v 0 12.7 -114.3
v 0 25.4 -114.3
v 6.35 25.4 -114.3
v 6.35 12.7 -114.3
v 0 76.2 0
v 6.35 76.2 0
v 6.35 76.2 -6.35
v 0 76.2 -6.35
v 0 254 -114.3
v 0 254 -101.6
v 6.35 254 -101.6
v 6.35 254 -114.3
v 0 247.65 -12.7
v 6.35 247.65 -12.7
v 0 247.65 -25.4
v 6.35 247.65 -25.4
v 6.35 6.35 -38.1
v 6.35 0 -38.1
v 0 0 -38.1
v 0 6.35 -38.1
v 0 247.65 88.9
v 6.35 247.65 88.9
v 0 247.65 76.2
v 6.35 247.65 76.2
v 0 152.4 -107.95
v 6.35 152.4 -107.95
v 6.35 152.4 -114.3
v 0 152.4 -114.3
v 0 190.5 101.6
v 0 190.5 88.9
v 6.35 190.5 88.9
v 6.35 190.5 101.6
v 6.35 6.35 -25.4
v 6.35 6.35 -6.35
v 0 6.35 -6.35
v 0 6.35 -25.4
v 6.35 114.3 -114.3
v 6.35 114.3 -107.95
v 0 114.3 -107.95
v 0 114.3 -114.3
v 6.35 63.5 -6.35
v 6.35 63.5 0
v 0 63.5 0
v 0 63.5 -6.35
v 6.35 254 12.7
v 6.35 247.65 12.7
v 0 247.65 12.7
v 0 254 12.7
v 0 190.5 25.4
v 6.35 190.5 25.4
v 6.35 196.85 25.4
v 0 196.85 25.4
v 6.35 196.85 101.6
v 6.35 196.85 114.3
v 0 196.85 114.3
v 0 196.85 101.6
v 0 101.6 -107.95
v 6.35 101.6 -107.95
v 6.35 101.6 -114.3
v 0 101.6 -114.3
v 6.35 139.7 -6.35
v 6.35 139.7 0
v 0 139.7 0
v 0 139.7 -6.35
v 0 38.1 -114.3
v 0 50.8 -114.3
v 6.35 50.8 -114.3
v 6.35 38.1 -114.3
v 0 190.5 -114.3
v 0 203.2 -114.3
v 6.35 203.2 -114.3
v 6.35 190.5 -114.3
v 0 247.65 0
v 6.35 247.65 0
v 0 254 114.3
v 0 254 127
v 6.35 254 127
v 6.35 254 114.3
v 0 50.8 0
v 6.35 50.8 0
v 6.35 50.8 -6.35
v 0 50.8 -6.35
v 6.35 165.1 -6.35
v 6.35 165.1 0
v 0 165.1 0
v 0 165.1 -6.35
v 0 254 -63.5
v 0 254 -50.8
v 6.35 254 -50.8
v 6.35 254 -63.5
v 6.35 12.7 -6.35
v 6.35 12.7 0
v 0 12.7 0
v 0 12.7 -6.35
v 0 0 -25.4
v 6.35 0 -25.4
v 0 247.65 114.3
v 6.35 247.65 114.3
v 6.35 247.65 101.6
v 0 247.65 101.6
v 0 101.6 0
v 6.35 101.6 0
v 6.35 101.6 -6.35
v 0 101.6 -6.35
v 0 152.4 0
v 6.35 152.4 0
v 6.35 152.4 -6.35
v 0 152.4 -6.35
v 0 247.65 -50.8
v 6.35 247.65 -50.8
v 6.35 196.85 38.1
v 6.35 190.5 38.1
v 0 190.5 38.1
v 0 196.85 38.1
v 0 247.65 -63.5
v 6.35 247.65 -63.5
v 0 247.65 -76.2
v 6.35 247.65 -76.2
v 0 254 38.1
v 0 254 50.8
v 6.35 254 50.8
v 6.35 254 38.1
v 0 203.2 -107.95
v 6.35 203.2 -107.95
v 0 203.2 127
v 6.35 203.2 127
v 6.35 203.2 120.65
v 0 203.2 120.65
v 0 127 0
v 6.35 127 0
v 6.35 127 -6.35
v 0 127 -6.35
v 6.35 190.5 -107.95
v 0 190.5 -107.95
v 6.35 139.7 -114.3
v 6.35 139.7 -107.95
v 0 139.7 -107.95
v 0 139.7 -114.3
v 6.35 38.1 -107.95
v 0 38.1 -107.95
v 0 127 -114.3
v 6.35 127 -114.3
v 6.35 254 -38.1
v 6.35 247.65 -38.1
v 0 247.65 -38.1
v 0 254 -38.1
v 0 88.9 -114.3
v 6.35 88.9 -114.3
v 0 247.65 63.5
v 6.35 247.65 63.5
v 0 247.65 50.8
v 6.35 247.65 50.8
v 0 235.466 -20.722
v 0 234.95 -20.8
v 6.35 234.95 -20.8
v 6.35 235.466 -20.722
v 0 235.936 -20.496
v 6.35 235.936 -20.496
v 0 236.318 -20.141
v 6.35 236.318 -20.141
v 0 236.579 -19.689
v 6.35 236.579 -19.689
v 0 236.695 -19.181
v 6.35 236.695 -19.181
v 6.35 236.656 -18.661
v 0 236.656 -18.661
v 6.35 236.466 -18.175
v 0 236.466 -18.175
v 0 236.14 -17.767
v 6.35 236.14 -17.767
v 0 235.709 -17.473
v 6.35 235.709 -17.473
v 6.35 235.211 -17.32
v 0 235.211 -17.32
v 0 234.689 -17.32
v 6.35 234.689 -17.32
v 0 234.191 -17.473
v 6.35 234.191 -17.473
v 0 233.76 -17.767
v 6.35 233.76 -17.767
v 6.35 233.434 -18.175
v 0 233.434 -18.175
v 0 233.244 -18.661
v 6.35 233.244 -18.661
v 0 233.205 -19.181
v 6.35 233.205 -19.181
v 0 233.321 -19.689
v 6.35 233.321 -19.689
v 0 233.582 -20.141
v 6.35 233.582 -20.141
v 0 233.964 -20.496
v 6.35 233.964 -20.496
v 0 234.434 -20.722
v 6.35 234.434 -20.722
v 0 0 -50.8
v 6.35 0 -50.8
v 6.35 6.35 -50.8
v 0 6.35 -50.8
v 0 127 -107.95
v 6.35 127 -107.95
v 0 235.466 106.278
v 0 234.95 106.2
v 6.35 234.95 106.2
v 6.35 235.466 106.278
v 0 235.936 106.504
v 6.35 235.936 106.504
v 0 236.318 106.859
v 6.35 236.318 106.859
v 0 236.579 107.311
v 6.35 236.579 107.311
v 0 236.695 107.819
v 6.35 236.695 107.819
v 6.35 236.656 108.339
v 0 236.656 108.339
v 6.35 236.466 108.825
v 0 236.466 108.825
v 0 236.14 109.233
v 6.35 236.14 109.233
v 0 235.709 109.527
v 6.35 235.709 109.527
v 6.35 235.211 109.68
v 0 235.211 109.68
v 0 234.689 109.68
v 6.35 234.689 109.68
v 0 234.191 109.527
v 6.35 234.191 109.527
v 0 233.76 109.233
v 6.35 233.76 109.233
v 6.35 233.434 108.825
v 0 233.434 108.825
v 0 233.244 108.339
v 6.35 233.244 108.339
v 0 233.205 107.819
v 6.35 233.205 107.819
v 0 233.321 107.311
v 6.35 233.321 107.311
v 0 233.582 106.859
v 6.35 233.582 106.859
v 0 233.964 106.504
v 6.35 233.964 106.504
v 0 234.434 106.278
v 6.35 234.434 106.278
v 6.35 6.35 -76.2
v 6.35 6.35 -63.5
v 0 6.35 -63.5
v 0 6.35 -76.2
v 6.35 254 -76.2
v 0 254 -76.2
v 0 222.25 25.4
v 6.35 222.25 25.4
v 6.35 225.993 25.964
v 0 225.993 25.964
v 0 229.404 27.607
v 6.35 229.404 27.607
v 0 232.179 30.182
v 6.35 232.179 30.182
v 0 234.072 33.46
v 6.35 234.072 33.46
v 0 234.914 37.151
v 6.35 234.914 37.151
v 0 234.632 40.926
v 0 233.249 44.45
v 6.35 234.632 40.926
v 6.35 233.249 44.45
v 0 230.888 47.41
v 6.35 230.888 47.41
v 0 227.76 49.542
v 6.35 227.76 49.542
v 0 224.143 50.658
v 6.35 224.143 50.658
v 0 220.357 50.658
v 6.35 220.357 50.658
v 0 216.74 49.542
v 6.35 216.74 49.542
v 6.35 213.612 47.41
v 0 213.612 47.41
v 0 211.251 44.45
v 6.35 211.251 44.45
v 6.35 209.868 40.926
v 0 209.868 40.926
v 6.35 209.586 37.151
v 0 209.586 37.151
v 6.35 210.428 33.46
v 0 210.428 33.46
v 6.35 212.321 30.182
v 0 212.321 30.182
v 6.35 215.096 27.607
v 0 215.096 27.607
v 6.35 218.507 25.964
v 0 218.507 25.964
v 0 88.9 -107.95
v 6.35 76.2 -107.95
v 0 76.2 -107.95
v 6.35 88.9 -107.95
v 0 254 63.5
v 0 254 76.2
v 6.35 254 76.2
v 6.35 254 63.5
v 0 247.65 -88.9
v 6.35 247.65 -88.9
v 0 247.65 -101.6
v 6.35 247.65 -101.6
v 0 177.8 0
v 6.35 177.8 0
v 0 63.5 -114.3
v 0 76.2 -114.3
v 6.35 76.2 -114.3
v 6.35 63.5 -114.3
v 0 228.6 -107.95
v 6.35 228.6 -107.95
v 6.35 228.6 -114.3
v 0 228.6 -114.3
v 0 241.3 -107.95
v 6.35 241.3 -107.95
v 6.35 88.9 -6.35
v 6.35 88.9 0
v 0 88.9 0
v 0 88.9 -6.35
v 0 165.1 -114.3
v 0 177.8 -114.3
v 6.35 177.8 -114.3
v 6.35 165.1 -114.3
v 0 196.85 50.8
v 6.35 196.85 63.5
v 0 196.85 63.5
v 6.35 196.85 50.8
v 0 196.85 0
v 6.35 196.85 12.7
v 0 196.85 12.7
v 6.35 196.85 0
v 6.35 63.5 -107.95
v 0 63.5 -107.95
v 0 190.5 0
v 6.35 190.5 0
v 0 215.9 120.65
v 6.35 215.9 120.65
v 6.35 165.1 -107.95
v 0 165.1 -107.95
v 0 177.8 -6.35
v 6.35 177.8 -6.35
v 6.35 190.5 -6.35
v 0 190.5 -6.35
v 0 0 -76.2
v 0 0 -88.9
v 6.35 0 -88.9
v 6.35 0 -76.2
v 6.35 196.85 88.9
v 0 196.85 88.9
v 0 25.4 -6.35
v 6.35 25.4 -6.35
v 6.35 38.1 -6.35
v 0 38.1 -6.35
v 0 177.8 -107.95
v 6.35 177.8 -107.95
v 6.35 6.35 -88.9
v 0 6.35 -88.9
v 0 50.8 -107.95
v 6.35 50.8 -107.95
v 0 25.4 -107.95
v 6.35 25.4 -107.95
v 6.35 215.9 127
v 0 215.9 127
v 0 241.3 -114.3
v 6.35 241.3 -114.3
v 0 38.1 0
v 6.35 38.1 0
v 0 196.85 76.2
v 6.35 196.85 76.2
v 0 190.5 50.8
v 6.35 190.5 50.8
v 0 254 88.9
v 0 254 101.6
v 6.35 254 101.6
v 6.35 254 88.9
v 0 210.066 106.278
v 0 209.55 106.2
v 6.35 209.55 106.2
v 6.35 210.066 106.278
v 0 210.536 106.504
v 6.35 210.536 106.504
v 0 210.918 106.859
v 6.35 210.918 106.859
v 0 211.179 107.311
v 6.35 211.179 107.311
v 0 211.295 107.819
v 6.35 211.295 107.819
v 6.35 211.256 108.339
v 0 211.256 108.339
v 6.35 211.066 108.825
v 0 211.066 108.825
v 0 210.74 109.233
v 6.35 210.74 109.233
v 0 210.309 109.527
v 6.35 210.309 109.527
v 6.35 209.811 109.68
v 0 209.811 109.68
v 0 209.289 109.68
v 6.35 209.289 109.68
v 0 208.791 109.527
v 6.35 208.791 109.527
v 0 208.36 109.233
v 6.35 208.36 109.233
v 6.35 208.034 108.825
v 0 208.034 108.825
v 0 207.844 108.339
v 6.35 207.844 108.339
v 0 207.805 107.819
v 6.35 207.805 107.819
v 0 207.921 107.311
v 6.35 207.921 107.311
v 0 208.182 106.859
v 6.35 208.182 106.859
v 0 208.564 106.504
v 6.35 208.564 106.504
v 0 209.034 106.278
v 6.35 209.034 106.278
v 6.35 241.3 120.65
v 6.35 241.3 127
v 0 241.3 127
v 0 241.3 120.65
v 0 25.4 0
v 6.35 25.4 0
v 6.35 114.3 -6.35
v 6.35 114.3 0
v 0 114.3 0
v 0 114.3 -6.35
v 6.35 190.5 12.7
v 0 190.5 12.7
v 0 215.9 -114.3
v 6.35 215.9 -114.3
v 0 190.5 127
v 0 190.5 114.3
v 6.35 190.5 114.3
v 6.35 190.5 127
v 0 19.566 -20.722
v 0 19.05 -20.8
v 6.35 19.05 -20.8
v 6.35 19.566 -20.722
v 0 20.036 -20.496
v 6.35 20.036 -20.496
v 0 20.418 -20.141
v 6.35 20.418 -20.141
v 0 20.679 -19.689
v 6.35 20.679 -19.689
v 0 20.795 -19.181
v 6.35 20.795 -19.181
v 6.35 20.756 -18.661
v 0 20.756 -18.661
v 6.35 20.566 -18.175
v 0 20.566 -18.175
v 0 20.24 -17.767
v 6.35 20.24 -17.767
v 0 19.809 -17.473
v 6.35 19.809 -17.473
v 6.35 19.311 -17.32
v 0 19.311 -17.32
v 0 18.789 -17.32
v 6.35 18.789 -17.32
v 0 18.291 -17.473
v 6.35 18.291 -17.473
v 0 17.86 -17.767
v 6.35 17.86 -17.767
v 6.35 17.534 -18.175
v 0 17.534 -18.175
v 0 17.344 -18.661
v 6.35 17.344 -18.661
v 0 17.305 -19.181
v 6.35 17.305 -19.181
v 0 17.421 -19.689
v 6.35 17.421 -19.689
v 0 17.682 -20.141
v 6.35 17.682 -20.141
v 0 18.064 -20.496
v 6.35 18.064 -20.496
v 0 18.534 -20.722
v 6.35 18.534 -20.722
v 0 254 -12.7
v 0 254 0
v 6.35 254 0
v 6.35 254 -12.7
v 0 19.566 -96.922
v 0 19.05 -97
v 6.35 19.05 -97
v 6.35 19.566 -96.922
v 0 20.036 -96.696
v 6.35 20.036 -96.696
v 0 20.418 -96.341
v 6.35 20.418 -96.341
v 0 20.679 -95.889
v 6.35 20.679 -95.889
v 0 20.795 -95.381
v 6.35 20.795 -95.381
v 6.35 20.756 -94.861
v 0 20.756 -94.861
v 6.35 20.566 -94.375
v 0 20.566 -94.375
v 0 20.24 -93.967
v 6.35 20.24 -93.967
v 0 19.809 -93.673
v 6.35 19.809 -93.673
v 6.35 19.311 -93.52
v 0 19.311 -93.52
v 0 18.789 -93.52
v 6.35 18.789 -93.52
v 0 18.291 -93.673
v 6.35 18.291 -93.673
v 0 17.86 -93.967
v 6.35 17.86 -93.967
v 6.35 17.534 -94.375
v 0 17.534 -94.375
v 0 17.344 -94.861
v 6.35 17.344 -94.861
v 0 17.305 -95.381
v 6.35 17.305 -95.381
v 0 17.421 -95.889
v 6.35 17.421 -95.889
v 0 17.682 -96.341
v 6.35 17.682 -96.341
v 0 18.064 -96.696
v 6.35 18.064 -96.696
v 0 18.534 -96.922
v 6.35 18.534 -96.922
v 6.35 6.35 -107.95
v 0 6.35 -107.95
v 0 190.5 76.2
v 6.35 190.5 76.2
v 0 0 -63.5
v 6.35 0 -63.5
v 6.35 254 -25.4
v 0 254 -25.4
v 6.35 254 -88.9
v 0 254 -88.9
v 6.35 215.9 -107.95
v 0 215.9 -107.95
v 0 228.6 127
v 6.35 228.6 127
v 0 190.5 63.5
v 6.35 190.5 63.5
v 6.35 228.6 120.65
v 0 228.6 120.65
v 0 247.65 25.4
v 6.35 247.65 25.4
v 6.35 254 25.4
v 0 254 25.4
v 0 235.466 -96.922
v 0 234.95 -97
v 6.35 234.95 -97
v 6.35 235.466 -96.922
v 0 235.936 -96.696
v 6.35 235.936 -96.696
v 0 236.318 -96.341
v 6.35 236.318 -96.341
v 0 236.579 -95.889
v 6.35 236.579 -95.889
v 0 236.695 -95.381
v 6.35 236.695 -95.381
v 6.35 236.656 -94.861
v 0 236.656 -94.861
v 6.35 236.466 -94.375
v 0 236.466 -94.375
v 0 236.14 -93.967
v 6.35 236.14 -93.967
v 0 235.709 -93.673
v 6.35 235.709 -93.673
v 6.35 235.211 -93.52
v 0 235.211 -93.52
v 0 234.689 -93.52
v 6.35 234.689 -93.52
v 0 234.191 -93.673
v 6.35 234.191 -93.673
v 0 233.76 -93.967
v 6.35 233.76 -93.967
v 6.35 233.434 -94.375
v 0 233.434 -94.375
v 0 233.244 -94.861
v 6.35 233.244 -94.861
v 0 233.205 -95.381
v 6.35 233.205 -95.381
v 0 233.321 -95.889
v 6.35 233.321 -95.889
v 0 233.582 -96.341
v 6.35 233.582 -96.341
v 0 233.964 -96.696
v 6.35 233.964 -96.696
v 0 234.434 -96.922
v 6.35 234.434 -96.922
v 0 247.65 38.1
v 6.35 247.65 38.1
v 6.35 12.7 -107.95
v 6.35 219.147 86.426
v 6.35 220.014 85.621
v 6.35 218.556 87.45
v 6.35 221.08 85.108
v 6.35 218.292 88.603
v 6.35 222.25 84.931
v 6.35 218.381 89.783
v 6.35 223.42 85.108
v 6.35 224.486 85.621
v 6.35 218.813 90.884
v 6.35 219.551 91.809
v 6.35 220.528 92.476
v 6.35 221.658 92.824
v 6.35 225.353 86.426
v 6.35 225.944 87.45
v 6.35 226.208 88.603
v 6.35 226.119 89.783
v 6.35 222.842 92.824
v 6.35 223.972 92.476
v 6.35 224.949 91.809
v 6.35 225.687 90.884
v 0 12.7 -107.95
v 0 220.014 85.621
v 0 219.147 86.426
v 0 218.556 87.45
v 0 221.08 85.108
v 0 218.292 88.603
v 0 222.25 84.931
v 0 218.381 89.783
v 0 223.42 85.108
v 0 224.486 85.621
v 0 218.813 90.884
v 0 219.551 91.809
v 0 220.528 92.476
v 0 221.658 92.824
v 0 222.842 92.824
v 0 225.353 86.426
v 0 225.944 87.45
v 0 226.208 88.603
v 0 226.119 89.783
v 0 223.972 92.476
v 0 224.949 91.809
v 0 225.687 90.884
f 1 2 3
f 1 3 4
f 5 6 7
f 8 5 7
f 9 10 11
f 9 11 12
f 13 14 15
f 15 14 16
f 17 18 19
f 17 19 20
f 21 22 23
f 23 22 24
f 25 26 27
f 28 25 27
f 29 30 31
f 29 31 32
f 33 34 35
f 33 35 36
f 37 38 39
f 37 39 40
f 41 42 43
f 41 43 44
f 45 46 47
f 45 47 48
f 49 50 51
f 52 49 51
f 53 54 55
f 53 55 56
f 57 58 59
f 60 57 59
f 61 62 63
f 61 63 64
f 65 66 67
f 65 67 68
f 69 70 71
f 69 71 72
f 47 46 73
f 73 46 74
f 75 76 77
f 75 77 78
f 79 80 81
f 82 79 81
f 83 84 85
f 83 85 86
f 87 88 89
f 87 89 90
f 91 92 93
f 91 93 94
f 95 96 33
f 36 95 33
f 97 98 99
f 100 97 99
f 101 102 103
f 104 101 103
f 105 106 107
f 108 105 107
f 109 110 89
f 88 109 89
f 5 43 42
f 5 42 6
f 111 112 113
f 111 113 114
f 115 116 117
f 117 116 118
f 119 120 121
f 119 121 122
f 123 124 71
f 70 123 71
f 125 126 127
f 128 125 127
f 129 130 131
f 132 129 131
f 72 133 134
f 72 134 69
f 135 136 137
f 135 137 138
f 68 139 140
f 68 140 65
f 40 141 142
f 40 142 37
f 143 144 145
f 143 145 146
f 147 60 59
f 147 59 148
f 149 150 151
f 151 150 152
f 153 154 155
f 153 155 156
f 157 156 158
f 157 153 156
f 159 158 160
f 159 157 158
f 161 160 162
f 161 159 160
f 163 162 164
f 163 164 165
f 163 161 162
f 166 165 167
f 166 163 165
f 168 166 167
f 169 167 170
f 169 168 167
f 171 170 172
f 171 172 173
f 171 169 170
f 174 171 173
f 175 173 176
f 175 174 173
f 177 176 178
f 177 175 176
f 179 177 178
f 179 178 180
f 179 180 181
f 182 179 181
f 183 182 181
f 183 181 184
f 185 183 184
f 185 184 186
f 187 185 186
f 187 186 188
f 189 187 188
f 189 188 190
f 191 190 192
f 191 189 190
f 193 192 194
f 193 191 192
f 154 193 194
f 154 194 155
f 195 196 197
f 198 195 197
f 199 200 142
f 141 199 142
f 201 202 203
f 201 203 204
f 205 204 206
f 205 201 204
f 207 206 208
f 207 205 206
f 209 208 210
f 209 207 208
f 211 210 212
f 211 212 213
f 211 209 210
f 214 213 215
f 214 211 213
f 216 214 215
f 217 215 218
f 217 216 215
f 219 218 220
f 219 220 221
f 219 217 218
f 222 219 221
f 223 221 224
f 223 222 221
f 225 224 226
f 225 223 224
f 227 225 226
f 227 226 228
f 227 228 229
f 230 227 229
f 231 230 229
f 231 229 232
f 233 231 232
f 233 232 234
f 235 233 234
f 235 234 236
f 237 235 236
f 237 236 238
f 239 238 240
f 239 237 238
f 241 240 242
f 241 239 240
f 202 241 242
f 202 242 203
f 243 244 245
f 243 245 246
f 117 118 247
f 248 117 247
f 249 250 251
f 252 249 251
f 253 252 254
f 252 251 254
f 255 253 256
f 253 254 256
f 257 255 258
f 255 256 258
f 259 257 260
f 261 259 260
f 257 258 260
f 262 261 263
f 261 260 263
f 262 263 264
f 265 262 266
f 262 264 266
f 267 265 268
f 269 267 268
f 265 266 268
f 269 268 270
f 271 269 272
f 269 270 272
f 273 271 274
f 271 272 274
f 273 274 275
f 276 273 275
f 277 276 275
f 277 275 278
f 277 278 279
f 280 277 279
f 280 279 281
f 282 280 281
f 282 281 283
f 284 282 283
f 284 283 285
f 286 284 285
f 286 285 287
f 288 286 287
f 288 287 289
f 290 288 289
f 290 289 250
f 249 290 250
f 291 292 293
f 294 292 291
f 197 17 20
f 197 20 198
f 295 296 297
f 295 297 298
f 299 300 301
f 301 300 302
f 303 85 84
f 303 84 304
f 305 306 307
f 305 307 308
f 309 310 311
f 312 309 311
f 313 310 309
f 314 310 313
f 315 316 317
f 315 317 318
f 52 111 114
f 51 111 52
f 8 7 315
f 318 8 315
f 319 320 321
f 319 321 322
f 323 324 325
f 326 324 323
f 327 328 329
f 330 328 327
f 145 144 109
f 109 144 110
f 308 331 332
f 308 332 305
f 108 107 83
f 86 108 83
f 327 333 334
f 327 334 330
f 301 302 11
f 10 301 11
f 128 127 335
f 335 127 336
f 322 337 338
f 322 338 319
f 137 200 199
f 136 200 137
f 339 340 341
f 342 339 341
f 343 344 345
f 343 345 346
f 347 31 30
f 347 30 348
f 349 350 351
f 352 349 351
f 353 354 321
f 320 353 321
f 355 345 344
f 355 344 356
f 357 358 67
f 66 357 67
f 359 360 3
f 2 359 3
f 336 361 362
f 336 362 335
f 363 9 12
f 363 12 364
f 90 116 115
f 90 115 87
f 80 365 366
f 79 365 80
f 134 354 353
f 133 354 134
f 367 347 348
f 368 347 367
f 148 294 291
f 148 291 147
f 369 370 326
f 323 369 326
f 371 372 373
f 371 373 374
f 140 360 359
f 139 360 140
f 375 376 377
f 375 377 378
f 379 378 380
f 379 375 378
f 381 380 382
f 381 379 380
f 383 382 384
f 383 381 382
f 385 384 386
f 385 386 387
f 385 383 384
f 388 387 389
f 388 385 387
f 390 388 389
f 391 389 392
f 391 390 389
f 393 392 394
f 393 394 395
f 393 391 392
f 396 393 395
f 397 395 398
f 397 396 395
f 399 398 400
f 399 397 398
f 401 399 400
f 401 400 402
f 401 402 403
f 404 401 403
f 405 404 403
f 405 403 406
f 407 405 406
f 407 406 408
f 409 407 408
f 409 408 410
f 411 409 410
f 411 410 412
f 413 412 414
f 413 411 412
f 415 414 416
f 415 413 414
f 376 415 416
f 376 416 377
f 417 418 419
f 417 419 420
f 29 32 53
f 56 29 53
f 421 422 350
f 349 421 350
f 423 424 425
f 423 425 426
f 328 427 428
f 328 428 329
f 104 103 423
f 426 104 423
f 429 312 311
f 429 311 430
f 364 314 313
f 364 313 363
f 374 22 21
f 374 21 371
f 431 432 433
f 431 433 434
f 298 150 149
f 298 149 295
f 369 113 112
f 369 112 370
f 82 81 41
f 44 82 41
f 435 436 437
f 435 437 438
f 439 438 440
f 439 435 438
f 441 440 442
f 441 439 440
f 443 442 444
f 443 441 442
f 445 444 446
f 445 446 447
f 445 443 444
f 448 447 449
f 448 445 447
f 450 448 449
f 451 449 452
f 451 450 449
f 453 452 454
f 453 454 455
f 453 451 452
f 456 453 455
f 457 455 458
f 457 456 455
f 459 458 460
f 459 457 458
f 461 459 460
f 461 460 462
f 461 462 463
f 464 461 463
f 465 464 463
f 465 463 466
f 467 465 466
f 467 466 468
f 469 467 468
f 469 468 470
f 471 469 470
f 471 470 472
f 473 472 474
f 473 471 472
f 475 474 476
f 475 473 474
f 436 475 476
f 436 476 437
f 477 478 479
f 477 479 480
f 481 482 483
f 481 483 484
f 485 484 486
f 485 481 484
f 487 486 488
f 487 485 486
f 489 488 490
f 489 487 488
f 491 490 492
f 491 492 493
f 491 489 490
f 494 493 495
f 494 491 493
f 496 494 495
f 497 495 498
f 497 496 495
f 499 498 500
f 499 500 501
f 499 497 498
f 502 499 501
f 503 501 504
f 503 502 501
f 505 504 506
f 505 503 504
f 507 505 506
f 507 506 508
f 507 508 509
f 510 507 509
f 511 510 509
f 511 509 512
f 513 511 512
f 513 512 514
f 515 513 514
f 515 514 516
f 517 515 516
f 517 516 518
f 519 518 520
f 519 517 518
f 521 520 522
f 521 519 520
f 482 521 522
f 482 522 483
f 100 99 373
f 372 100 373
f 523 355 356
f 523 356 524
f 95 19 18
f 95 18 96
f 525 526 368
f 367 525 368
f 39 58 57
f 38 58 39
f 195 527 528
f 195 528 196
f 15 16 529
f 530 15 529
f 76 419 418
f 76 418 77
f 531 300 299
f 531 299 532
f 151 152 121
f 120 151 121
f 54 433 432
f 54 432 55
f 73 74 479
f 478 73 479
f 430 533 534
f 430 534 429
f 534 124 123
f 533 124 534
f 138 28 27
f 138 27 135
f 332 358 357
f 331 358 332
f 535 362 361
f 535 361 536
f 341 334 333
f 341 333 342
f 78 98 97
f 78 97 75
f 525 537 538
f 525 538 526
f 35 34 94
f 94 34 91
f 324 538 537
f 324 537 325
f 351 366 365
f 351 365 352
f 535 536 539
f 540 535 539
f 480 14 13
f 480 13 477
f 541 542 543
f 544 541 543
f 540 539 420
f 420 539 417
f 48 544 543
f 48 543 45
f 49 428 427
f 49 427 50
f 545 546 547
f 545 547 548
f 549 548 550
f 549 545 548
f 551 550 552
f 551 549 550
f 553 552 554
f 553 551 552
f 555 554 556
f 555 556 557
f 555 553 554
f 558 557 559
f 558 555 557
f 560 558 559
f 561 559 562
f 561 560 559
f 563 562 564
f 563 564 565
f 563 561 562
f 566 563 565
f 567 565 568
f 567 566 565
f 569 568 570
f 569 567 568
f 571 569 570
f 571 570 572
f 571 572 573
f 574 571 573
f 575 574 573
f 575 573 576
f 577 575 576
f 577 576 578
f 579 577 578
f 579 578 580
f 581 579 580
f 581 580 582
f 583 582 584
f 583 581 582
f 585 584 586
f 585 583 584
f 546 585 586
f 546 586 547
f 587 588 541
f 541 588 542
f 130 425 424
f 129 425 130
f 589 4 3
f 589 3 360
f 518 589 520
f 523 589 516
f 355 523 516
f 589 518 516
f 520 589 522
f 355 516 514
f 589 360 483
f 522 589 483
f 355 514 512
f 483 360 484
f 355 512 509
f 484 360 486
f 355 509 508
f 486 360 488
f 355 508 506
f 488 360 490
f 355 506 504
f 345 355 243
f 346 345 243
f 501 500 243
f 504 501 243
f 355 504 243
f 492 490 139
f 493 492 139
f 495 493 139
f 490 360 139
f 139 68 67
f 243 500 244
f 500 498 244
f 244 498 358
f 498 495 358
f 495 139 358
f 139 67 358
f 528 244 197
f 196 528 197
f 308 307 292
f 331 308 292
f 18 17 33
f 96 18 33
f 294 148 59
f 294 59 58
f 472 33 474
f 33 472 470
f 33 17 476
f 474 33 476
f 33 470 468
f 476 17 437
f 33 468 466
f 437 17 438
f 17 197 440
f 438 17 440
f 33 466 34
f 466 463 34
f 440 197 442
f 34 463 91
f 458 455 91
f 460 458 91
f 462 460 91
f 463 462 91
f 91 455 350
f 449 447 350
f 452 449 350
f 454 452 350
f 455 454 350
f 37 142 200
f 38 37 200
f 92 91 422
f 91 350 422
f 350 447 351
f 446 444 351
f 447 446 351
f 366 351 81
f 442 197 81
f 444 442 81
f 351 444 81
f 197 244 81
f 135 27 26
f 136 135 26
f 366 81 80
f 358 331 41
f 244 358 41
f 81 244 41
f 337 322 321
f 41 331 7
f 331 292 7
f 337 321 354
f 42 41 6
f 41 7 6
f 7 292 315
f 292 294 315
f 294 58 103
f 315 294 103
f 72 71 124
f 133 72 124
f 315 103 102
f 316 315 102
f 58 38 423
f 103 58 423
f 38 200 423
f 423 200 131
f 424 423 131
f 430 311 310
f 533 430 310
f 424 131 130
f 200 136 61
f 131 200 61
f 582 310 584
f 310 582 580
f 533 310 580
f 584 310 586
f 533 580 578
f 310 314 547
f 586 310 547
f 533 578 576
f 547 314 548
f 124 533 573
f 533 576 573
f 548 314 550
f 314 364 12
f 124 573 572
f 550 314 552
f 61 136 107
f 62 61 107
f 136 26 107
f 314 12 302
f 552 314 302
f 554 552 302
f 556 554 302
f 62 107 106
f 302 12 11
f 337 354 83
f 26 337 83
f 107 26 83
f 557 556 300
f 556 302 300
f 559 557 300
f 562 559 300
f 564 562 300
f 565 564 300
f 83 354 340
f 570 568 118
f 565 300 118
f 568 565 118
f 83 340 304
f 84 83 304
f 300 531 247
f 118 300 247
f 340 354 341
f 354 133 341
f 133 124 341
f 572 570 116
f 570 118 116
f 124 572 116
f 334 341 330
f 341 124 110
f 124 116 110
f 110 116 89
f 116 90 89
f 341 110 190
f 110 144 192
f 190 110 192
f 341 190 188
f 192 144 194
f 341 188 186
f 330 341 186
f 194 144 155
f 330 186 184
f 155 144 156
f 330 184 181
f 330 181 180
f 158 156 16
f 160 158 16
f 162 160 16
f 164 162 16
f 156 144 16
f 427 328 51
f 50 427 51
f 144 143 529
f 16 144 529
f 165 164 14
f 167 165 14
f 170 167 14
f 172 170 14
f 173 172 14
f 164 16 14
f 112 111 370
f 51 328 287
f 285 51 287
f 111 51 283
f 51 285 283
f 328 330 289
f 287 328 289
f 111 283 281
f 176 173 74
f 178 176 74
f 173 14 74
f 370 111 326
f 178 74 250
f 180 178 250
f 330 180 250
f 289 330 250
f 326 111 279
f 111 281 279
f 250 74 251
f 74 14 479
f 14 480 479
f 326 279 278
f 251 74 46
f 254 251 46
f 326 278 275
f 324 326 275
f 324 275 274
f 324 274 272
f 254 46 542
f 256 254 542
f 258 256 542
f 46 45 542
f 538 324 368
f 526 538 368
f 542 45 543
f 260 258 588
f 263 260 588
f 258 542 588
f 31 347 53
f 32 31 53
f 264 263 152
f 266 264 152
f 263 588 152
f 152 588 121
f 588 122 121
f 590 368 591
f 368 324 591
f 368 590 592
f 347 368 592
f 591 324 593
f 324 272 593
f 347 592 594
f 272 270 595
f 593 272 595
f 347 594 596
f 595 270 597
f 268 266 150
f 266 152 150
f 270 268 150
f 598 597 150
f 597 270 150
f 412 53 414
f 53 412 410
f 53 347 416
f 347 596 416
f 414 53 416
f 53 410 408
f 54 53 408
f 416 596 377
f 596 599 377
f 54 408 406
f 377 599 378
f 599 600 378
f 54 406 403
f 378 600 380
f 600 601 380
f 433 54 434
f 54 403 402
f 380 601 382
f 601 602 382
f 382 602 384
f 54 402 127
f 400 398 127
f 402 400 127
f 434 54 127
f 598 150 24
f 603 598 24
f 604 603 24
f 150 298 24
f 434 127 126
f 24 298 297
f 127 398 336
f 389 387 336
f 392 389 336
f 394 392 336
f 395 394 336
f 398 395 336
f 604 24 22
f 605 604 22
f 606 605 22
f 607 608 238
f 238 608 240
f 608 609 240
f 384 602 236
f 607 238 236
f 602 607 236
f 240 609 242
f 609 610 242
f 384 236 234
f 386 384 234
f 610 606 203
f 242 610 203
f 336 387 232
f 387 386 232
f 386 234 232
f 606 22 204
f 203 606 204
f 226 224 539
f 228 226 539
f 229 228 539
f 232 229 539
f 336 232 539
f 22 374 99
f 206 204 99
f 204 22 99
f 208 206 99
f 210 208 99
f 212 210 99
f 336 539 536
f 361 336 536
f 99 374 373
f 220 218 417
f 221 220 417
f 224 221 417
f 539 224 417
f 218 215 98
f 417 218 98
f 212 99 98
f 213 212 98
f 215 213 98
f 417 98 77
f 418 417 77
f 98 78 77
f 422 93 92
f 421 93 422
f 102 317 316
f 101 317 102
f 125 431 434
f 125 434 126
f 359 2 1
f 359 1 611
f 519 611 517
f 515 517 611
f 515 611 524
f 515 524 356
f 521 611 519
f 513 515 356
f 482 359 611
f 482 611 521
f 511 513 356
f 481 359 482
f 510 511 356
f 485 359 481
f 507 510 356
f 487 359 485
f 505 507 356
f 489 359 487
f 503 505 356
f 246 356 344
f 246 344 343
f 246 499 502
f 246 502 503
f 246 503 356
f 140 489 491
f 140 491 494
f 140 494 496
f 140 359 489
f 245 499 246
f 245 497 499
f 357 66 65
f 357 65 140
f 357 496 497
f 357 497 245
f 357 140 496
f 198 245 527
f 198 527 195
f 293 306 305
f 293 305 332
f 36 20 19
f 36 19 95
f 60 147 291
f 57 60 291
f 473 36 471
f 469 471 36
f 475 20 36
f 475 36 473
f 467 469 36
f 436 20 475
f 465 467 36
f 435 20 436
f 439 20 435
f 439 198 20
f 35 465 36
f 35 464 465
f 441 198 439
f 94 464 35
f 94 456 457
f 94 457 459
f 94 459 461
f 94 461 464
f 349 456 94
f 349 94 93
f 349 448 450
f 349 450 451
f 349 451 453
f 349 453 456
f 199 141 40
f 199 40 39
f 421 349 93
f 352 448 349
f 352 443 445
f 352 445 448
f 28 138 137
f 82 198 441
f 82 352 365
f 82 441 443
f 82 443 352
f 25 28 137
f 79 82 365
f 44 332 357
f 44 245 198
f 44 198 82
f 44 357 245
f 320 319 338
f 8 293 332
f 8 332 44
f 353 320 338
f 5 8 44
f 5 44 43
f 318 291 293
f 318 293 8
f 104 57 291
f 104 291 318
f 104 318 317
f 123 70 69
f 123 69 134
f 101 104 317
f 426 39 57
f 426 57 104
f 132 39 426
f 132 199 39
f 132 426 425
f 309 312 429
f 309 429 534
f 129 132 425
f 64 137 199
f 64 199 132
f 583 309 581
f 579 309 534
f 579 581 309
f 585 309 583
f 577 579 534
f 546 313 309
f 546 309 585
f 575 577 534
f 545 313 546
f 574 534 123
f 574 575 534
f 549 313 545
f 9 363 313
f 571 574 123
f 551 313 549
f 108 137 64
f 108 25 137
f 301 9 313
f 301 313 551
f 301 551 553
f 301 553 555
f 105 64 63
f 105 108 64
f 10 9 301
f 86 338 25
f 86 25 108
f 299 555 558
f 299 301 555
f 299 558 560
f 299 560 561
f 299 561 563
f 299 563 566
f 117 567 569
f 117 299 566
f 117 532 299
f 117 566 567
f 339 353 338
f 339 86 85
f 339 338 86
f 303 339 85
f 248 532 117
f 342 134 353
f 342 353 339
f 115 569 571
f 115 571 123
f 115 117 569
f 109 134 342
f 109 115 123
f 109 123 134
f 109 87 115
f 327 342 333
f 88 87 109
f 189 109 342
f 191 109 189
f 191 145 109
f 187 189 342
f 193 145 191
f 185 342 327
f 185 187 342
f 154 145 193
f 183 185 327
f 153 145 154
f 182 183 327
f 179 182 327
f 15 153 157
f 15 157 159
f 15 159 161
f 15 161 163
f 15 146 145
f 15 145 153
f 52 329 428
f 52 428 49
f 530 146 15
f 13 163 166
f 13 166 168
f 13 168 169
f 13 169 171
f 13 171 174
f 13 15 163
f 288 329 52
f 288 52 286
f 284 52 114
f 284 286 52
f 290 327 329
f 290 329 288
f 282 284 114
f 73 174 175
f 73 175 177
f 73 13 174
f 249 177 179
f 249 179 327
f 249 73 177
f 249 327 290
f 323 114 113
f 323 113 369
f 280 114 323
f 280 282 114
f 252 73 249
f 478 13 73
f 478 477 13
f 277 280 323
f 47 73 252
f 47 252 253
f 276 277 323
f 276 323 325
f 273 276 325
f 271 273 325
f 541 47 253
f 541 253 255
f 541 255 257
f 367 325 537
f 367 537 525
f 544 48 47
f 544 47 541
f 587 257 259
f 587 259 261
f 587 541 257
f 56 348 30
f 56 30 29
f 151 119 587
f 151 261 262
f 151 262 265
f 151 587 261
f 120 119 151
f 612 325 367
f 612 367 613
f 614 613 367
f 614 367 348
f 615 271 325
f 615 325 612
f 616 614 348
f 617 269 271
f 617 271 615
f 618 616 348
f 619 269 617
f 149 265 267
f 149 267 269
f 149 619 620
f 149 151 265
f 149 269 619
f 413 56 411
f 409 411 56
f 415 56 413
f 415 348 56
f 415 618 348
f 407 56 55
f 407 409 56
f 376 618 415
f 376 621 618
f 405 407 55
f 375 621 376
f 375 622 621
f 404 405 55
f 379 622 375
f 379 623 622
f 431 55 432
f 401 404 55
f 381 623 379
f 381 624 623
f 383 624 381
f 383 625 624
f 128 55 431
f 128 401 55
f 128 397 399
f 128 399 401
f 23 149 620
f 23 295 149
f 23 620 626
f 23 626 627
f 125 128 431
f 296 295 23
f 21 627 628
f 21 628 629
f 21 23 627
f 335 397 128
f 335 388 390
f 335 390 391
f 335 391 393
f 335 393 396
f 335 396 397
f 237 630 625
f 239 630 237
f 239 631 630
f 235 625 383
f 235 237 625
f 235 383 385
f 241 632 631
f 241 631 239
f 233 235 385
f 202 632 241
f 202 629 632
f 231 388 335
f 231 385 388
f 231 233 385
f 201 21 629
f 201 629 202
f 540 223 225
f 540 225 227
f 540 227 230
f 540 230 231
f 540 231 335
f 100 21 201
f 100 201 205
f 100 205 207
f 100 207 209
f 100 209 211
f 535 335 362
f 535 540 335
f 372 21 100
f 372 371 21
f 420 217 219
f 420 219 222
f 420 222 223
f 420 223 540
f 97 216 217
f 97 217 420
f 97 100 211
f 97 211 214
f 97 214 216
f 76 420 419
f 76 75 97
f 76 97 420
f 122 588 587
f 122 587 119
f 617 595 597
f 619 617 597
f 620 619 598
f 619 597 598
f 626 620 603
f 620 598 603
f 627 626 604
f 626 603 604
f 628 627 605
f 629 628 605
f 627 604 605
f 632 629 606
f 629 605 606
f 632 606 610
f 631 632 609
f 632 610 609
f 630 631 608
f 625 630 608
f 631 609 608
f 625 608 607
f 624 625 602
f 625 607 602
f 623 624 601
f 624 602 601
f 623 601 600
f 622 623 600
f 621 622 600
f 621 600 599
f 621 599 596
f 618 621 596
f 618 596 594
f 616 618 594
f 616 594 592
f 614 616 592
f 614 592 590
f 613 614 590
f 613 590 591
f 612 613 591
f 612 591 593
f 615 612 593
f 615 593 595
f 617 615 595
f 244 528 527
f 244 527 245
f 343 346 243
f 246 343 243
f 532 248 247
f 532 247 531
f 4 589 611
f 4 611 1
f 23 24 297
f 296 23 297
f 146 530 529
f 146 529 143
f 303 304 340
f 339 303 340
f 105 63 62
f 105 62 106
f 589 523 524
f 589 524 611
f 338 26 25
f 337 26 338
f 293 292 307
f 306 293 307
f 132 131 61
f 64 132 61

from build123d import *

# Parameters (mm, degrees)
SKETCH1_R           = 1.75
BOSS_EXTRUDE1_DEPTH = 6.35
SKETCH2_W           = 12.7
SKETCH2_H           = 6.35
CUT_EXTRUDE1_DEPTH  = 7.35
LPATTERN1_COUNT     = 10
LPATTERN1_PITCH     = 25.4
SKETCH3_W           = 6.35
SKETCH3_H           = 12.7
CUT_EXTRUDE2_DEPTH  = 7.35
LPATTERN2_COUNT     = 10
LPATTERN2_PITCH     = 25.4
SKETCH4_W           = 6.35
SKETCH4_H           = 12.7
CUT_EXTRUDE3_DEPTH  = 7.35
SKETCH5_W           = 12.7
SKETCH5_H           = 6.35
CUT_EXTRUDE4_DEPTH  = 7.35
LPATTERN3_COUNT     = 5
LPATTERN3_PITCH     = 25.4
SKETCH6_W           = 6.35
SKETCH6_H           = 12.7
CUT_EXTRUDE5_DEPTH  = 7.35
LPATTERN4_COUNT     = 8
LPATTERN4_PITCH     = 25.4
SKETCH7_W           = 12.7
SKETCH7_H           = 6.35
CUT_EXTRUDE6_DEPTH  = 7.35
SKETCH8_W           = 6.35
SKETCH8_H           = 6.35
CUT_EXTRUDE7_DEPTH  = 7.35
SKETCH9_R           = 3.96875
CUT_EXTRUDE8_DEPTH  = 7.35
SKETCH10_R          = 12.7
CUT_EXTRUDE9_DEPTH  = 7.35


with BuildPart() as part:
    # Sketch1 → Boss-Extrude1 (new body)
    with BuildSketch(Plane(origin=(0, 0, 0), x_dir=(0, 0, -1), z_dir=(1, 0, 0))):
        Polygon((0, 0), (0, 190.5), (-127, 190.5), (-127, 254), (114.3, 254), (114.3, 0), align=None)
        with Locations((-107.95, 234.95)):
            Circle(SKETCH1_R, mode=Mode.SUBTRACT)
        with Locations((-107.95, 209.55)):
            Circle(SKETCH1_R, mode=Mode.SUBTRACT)
        with Locations((19.05, 234.95)):
            Circle(SKETCH1_R, mode=Mode.SUBTRACT)
        with Locations((95.25, 234.95)):
            Circle(SKETCH1_R, mode=Mode.SUBTRACT)
        with Locations((19.05, 19.05)):
            Circle(SKETCH1_R, mode=Mode.SUBTRACT)
        with Locations((95.25, 19.05)):
            Circle(SKETCH1_R, mode=Mode.SUBTRACT)
    extrude(amount=BOSS_EXTRUDE1_DEPTH)

    # Sketch2 → Cut-Extrude1 (cut, through all)
    with BuildSketch(Plane(origin=(6.35, 0, 0), x_dir=(0, 0, -1), z_dir=(1, 0, 0))):
        with Locations((-107.95, 250.825)):
            Rectangle(SKETCH2_W, SKETCH2_H)
    cut_extrude1 = extrude(amount=-CUT_EXTRUDE1_DEPTH, mode=Mode.SUBTRACT)

    # LPattern1: Cut-Extrude1 ×10
    with Locations(*[(0, 0, -i * LPATTERN1_PITCH) for i in range(1, LPATTERN1_COUNT)]):
        add(cut_extrude1, mode=Mode.SUBTRACT)

    # Sketch3 → Cut-Extrude2 (cut, through all)
    with BuildSketch(Plane(origin=(6.35, 0, 0), x_dir=(0, 0, -1), z_dir=(1, 0, 0))):
        with Locations((111.125, 234.95)):
            Rectangle(SKETCH3_W, SKETCH3_H)
    cut_extrude2 = extrude(amount=-CUT_EXTRUDE2_DEPTH, mode=Mode.SUBTRACT)

    # LPattern2: Cut-Extrude2 ×10
    with Locations(*[(0, -i * LPATTERN2_PITCH, 0) for i in range(1, LPATTERN2_COUNT)]):
        add(cut_extrude2, mode=Mode.SUBTRACT)

    # Sketch4 → Cut-Extrude3 (cut, through all)
    with BuildSketch(Plane(origin=(6.35, 0, 0), x_dir=(0, 0, -1), z_dir=(1, 0, 0))):
        with Locations((-123.825, 234.95)):
            Rectangle(SKETCH4_W, SKETCH4_H)
        with Locations((-123.825, 209.55)):
            Rectangle(SKETCH4_W, SKETCH4_H)
    extrude(amount=-CUT_EXTRUDE3_DEPTH, mode=Mode.SUBTRACT)

    # Sketch5 → Cut-Extrude4 (cut, through all)
    with BuildSketch(Plane(origin=(6.35, 0, 0), x_dir=(0, 0, -1), z_dir=(1, 0, 0))):
        with Locations((-107.95, 193.675)):
            Rectangle(SKETCH5_W, SKETCH5_H)
    cut_extrude4 = extrude(amount=-CUT_EXTRUDE4_DEPTH, mode=Mode.SUBTRACT)

    # LPattern3: Cut-Extrude4 ×5
    with Locations(*[(0, 0, -i * LPATTERN3_PITCH) for i in range(1, LPATTERN3_COUNT)]):
        add(cut_extrude4, mode=Mode.SUBTRACT)

    # Sketch6 → Cut-Extrude5 (cut, through all)
    with BuildSketch(Plane(origin=(6.35, 0, 0), x_dir=(0, 0, -1), z_dir=(1, 0, 0))):
        with Locations((3.175, 6.35)):
            Rectangle(SKETCH6_W, SKETCH6_H)
    cut_extrude5 = extrude(amount=-CUT_EXTRUDE5_DEPTH, mode=Mode.SUBTRACT)

    # LPattern4: Cut-Extrude5 ×8
    with Locations(*[(0, i * LPATTERN4_PITCH, 0) for i in range(1, LPATTERN4_COUNT)]):
        add(cut_extrude5, mode=Mode.SUBTRACT)

    # Sketch7 → Cut-Extrude6 (cut, through all)
    with BuildSketch(Plane(origin=(6.35, 0, 0), x_dir=(0, 0, -1), z_dir=(1, 0, 0))):
        with Locations((19.05, 3.175)):
            Rectangle(SKETCH7_W, SKETCH7_H)
        with Locations((44.45, 3.175)):
            Rectangle(SKETCH7_W, SKETCH7_H)
        with Locations((69.85, 3.175)):
            Rectangle(SKETCH7_W, SKETCH7_H)
        with Locations((95.25, 3.175)):
            Rectangle(SKETCH7_W, SKETCH7_H)
    extrude(amount=-CUT_EXTRUDE6_DEPTH, mode=Mode.SUBTRACT)

    # Sketch8 → Cut-Extrude7 (cut, through all)
    with BuildSketch(Plane(origin=(6.35, 0, 0), x_dir=(0, 0, -1), z_dir=(1, 0, 0))):
        with Locations((9.525, 3.175)):
            Rectangle(SKETCH8_W, SKETCH8_H)
        with Locations((104.775, 3.175)):
            Rectangle(SKETCH8_W, SKETCH8_H)
    extrude(amount=-CUT_EXTRUDE7_DEPTH, mode=Mode.SUBTRACT)

    # Sketch9 → Cut-Extrude8 (cut, through all)
    with BuildSketch(Plane(origin=(6.35, 0, 0), x_dir=(0, 0, -1), z_dir=(1, 0, 0))):
        with Locations((-88.9, 222.25)):
            Circle(SKETCH9_R)
    extrude(amount=-CUT_EXTRUDE8_DEPTH, mode=Mode.SUBTRACT)

    # Sketch10 → Cut-Extrude9 (cut, through all)
    with BuildSketch(Plane(origin=(6.35, 0, 0), x_dir=(0, 0, -1), z_dir=(1, 0, 0))):
        with Locations((-38.1, 222.25)):
            Circle(SKETCH10_R)
    extrude(amount=-CUT_EXTRUDE9_DEPTH, mode=Mode.SUBTRACT)


solid = part.part
